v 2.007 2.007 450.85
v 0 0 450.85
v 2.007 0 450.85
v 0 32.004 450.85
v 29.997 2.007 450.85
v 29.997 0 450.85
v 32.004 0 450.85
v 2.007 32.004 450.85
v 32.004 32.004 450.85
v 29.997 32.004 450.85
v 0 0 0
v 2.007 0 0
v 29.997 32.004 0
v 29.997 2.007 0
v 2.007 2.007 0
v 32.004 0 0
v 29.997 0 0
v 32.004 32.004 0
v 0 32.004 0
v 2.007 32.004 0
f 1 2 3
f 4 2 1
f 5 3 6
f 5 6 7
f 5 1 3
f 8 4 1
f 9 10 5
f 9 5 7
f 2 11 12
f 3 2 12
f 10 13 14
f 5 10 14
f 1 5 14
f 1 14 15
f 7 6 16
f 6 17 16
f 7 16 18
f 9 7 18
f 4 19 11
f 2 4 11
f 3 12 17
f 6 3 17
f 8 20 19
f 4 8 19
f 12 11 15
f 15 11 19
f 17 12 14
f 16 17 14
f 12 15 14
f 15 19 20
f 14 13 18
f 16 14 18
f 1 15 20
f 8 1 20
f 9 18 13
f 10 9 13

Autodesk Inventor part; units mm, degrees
ref_plane "YZ Plane" through (0, 0, 0) normal (1, 0, 0) x (0, 1, 0)
ref_plane "XZ Plane" through (0, 0, 0) normal (0, 1, 0) x (-1, 0, 0)
ref_plane "XY Plane" through (0, 0, 0) normal (0, 0, 1) x (1, 0, 0)
sketch "Sketch1" plane through (0, 0, 0) normal (0, 0, 1) x (1, 0, 0)
  line L0 (2.0066, 32.004) -> (0, 32.004)
  line L1 (0, 32.004) -> (0, 0)
  line L2 (0, 0) -> (2.0066, 0)
  line L3 (2.0066, 2.0066) -> (2.0066, 32.004)
  line L4 (2.0066, 0) -> (29.9974, 0)
  line L5 (29.9974, 2.0066) -> (2.0066, 2.0066)
  line L6 (29.9974, 0) -> (32.004, 0)
  line L7 (32.004, 0) -> (32.004, 32.004)
  line L8 (32.004, 32.004) -> (29.9974, 32.004)
  line L9 (29.9974, 32.004) -> (29.9974, 2.0066)
  dimension "d2" = 2.0066
  dimension "d3" = 32.004
sketch "Sketch2" plane through (0, 0, 0) normal (0, 0, 1) x (1, 0, 0)
  point P0 (0, 0)
extrude "Extrusion1" add sketch "Sketch1" along normal blind 450.85
properties part number "USEsolid7"
